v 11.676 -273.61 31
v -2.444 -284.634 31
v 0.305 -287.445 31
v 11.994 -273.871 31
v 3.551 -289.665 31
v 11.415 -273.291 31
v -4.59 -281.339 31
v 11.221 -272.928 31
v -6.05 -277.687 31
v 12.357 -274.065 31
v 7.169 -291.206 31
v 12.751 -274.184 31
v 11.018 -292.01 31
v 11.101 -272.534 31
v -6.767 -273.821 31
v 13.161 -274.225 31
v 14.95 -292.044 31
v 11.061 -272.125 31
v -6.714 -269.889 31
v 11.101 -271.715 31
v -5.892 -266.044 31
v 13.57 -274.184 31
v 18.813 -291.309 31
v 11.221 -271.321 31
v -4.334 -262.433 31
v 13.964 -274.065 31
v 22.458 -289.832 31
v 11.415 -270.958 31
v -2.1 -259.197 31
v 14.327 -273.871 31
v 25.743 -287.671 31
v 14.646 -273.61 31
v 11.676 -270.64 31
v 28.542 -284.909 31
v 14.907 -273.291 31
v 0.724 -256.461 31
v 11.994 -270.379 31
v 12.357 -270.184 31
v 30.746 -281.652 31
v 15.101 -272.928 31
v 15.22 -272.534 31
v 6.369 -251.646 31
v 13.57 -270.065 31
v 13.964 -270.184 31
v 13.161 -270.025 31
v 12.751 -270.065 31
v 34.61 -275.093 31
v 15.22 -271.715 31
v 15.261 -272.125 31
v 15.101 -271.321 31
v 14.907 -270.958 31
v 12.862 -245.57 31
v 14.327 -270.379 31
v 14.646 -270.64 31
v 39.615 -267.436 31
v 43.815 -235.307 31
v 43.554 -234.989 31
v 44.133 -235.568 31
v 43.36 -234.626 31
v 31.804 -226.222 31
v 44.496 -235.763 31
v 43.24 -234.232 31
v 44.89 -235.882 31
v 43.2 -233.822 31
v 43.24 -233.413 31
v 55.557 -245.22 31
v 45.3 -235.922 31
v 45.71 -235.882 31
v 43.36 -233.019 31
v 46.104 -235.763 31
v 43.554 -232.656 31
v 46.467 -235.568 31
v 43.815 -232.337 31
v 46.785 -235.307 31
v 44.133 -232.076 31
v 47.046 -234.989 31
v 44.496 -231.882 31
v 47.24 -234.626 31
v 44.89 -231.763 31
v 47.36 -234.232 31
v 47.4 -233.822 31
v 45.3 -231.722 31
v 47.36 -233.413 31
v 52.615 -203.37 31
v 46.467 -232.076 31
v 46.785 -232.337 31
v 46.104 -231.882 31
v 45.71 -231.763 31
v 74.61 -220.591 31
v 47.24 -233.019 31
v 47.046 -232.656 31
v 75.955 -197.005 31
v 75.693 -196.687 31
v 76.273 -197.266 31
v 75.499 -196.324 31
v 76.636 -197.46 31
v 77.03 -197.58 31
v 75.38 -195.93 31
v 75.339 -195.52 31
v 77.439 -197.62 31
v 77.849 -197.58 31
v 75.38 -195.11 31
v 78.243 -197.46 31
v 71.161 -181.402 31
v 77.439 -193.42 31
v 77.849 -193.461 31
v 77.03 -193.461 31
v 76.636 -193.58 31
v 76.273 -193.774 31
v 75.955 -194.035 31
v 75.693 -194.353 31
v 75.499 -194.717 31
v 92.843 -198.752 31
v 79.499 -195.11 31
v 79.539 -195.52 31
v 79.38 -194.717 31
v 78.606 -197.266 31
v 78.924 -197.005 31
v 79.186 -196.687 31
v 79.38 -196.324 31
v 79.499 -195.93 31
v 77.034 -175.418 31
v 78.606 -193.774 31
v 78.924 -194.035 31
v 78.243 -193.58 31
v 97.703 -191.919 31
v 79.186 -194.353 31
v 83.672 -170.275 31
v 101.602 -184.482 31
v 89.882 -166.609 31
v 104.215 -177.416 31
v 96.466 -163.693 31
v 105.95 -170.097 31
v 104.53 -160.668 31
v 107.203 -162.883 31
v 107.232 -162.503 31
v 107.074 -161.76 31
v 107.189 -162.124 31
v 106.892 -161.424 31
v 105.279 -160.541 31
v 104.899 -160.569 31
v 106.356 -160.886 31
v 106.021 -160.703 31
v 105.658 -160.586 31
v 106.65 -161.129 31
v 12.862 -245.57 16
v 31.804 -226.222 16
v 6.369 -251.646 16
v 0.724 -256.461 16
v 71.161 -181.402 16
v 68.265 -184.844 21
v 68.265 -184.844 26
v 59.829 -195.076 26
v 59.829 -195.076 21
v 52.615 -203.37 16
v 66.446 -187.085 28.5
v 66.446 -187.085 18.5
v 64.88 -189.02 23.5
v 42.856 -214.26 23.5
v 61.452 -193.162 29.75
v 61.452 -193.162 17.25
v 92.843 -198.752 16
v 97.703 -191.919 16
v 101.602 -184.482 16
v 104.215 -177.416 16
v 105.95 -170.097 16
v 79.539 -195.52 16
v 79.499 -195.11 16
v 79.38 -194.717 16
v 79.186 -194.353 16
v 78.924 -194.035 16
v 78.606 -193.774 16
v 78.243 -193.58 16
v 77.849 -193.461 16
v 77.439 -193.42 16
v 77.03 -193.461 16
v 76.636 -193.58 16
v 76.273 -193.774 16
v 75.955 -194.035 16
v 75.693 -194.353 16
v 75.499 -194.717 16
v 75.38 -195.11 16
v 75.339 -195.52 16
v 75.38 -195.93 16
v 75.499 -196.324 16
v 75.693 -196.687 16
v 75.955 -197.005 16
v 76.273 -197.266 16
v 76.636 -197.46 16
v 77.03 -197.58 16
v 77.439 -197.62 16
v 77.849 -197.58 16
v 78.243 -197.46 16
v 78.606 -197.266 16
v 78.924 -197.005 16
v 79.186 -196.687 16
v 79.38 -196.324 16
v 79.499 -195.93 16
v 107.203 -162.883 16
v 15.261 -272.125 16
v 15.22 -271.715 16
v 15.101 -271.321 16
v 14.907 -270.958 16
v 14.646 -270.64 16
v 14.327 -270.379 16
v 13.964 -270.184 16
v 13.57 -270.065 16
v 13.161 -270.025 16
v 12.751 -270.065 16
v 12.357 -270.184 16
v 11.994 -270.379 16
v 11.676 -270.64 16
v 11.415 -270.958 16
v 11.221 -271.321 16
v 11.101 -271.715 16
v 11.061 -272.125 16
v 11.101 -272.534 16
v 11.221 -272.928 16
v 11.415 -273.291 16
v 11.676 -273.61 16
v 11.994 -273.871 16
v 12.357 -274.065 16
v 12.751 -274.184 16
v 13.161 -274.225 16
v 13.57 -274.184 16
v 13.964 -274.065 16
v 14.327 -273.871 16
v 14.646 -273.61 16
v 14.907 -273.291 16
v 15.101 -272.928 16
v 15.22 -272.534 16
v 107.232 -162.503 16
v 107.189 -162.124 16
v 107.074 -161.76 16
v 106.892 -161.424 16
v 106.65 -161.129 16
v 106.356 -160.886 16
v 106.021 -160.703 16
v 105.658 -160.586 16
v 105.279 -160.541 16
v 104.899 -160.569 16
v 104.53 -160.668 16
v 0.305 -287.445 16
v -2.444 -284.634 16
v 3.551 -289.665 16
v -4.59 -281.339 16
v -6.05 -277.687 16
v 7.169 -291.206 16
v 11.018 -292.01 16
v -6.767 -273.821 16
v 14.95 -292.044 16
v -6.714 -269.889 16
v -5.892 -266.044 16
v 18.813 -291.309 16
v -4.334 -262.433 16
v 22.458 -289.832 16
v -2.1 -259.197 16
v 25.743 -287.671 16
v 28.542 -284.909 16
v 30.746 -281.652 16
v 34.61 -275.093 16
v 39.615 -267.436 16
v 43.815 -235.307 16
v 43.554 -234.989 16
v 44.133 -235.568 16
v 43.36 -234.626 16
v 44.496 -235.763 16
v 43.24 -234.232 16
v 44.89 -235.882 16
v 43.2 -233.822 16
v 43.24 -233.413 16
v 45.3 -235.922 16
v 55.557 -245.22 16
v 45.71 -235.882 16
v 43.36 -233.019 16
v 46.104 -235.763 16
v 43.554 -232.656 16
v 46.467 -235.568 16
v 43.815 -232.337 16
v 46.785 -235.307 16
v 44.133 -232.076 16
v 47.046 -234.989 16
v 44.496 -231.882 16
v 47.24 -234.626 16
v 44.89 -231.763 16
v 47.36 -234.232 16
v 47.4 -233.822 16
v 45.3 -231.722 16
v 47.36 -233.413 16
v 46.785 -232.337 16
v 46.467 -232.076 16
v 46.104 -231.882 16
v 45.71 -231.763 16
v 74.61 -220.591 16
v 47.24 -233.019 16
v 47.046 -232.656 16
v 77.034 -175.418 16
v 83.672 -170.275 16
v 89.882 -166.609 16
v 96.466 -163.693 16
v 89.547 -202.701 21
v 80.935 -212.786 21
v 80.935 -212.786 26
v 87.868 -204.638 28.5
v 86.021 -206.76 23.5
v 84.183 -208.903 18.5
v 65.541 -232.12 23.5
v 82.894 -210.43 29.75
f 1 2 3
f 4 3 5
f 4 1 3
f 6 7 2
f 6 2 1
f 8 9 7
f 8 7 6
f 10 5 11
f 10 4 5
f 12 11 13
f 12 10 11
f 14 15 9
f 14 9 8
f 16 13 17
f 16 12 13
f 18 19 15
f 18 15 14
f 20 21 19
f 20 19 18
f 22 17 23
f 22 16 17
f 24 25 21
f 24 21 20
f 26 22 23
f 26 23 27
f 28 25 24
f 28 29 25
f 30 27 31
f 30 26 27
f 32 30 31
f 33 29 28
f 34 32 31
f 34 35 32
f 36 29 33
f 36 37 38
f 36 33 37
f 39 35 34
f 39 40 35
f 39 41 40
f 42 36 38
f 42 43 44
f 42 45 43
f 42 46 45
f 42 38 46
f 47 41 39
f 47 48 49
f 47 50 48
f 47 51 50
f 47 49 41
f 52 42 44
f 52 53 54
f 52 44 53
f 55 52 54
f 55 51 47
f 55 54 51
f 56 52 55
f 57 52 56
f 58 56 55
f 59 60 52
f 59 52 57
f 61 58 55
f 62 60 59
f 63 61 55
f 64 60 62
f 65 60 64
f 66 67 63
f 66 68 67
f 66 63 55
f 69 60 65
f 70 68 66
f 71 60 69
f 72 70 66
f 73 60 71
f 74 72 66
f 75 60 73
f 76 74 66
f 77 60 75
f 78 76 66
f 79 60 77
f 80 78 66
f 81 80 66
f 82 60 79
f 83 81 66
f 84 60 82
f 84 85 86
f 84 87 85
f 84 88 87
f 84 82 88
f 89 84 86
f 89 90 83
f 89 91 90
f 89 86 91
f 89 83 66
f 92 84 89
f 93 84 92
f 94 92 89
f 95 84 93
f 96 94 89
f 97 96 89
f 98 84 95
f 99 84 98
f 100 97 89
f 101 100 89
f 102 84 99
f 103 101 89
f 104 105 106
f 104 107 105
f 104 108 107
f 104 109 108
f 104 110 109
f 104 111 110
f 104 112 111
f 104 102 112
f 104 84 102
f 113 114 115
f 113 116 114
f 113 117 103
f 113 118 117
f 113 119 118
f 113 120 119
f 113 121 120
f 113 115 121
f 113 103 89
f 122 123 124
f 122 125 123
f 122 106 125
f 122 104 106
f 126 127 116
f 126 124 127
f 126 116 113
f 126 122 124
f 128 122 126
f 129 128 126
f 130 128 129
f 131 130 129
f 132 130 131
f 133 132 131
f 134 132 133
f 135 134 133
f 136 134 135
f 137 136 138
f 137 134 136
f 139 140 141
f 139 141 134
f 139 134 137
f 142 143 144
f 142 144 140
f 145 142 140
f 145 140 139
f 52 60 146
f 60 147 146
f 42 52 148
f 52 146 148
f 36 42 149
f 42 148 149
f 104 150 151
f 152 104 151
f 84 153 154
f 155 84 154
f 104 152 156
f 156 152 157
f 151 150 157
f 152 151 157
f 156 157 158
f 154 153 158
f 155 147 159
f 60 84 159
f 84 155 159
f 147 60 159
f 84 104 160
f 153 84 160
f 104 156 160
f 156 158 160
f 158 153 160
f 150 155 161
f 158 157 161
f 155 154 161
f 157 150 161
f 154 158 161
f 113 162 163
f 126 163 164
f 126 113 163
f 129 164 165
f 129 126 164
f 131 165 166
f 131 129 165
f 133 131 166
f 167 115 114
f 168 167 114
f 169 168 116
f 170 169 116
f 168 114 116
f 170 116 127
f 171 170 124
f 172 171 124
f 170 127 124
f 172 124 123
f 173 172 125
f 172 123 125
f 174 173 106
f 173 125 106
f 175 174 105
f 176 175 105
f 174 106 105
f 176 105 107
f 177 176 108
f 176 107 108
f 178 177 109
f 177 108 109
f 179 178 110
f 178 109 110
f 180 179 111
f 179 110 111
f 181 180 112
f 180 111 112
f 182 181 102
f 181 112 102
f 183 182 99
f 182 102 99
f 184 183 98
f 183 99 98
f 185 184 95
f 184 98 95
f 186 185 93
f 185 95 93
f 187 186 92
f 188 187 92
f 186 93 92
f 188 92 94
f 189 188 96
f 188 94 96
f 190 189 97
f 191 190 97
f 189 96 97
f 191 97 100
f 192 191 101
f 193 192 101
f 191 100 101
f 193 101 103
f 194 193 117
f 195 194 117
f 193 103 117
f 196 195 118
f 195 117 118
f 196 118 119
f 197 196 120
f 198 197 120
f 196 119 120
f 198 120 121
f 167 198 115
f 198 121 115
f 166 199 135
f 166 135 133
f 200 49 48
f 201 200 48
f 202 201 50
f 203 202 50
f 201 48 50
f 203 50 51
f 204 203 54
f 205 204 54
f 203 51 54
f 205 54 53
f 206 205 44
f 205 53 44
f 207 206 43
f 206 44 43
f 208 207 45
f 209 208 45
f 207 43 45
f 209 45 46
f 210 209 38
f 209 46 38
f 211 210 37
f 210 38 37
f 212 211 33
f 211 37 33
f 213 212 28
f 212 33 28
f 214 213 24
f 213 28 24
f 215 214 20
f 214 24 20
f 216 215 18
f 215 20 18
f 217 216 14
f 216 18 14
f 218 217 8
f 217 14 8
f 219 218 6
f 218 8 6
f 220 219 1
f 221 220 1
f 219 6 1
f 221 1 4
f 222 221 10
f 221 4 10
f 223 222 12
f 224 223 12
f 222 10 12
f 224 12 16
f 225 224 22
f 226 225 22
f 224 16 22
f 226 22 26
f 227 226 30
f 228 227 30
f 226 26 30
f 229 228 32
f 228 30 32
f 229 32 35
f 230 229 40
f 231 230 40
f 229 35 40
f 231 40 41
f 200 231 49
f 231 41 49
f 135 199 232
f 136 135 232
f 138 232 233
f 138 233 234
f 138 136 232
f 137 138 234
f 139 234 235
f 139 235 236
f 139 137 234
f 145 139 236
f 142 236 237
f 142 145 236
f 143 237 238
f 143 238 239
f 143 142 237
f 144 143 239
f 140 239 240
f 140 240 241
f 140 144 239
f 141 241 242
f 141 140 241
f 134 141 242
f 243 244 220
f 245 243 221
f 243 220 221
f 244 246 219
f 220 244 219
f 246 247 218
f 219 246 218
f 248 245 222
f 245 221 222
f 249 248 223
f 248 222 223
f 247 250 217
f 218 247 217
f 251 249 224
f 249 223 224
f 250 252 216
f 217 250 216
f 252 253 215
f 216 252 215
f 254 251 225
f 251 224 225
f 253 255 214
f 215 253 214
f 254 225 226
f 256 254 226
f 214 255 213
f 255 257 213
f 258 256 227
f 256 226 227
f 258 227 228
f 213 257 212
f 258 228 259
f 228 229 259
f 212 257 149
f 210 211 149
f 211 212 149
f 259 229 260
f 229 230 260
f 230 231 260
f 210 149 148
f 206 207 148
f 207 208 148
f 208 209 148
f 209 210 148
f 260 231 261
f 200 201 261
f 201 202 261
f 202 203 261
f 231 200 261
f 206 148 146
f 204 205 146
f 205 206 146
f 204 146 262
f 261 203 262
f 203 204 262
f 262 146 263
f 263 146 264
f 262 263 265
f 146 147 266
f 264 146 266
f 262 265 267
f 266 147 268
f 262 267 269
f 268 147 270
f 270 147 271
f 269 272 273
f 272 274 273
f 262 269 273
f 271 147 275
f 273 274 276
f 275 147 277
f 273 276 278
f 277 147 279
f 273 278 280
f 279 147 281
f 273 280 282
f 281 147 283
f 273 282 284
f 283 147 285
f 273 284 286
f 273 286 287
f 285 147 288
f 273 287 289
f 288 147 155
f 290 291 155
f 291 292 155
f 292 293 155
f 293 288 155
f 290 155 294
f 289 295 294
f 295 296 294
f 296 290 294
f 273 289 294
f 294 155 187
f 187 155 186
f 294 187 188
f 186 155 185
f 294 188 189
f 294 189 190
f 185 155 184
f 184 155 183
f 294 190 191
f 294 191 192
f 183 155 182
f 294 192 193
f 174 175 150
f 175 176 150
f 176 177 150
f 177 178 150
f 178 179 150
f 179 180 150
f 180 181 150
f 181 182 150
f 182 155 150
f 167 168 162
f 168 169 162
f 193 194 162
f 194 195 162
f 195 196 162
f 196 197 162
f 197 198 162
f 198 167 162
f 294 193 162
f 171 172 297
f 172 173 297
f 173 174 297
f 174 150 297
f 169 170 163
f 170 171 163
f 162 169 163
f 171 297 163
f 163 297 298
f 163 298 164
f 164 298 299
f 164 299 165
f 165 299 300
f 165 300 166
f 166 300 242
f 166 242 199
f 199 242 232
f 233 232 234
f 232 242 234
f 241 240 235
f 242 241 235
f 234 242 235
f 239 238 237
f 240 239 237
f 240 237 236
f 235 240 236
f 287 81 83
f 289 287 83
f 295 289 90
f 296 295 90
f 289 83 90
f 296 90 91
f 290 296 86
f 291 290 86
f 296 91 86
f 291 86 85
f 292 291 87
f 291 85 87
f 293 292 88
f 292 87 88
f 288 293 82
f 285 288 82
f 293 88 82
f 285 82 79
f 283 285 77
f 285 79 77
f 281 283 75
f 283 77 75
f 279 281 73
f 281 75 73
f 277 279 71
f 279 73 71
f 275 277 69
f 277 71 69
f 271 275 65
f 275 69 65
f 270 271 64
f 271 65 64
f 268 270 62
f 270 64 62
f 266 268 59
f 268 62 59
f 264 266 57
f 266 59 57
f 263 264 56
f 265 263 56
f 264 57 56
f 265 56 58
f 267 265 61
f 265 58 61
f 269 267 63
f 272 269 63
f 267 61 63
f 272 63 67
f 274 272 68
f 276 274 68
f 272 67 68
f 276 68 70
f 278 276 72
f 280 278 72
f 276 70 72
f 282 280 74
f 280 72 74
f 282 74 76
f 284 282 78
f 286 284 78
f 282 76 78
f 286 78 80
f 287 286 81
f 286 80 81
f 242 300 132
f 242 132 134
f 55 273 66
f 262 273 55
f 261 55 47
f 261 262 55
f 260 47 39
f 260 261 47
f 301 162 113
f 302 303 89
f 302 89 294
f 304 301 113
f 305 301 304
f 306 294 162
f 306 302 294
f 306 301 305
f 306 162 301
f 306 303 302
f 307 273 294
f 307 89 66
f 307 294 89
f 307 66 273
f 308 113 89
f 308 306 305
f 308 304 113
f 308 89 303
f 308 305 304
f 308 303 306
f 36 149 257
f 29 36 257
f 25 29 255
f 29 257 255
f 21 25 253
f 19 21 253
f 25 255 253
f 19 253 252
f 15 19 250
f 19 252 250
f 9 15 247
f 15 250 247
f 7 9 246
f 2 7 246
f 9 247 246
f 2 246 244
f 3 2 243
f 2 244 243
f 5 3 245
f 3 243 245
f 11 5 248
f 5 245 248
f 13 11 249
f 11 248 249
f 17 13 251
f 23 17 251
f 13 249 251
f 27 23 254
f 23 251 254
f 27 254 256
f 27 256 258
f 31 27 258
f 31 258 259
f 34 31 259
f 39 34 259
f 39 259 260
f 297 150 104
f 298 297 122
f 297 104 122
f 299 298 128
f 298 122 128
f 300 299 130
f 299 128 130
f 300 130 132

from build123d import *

# Parameters (mm, degrees)
SKETCH3_R           = 1.6
BOSS_EXTRUDE1_DEPTH = 15
CUT_EXTRUDE1_START  = -15
SKETCH4_R           = 1.6
CUT_EXTRUDE1_DEPTH  = 15
FILLET3_R           = 62
SKETCH5_R           = 2.1
CUT_EXTRUDE2_DEPTH  = 15
FILLET4_R           = 2


with BuildPart() as part:
    # Sketch3 → Boss-Extrude1 (new body)
    with BuildSketch(Plane.XY.offset(16)):
        with BuildLine():
            ThreePointArc((155.019115612, -142.985112199), (159.394881243, -97.849485606), (115.704809966, -109.996492831))
            add(Edge.make_bspline(
                [(115.704809966, -109.996492831), (101.94879758, -150.116707379), (78.178790791, -171.772825461), (58.717079478, -197.082387325), (16.356999542, -244.049515564), (0.72448619, -256.46124476)],
                knots=[0, 0, 0, 0, 0.619090324, 0.719090324, 1, 1, 1, 1], degree=3))
            ThreePointArc((0.72448619, -256.46124476), (0.304947846, -287.445485278), (30.74561606, -281.651963762))
            add(Edge.make_bspline(
                [(155.019115612, -142.985112199), (117.897123756, -163.498941991), (100.69762913, -190.668374405), (79.152067085, -214.229377889), (40.254225745, -264.101669257), (30.74561606, -281.651963762)],
                knots=[0, 0, 0, 0, 0.619090324, 0.719090324, 1, 1, 1, 1], degree=3))
        make_face()
        with Locations((135.218221977, -112.415707792)):
            Circle(SKETCH3_R, mode=Mode.SUBTRACT)
        with Locations((148.218221977, -112.415707792)):
            Circle(SKETCH3_R, mode=Mode.SUBTRACT)
        with Locations((148.218221977, -125.415707792)):
            Circle(SKETCH3_R, mode=Mode.SUBTRACT)
        with Locations((135.218221977, -125.415707792)):
            Circle(SKETCH3_R, mode=Mode.SUBTRACT)
        with Locations((77.439461008, -195.520152104)):
            Circle(SKETCH3_R, mode=Mode.SUBTRACT)
        with Locations((45.300080524, -233.82237426)):
            Circle(SKETCH3_R, mode=Mode.SUBTRACT)
        with Locations((13.16070004, -272.124596416)):
            Circle(SKETCH3_R, mode=Mode.SUBTRACT)
    extrude(amount=BOSS_EXTRUDE1_DEPTH)

    # Sketch4 → Cut-Extrude1 (cut)
    with BuildSketch(Plane.XY.offset(31).offset(CUT_EXTRUDE1_START)):
        with BuildLine():
            add(Edge.make_bspline(
                [(115.704809966, -109.996492831), (106.058622012, -138.130164086), (93.113701565, -155.703600822), (81.681620369, -169.238644056)],
                knots=[0, 0, 0, 0, 0.434127381, 0.434127381, 0.434127381, 0.434127381], degree=3))
            Line((81.681620369, -169.238644056), (107.801063948, -159.441089101))
            Line((107.801063948, -159.441089101), (103.173332299, -186.075062907))
            add(Edge.make_bspline(
                [(155.019115612, -142.985112199), (129.435323739, -157.122865204), (114.450199889, -172.627251292), (103.173332299, -186.075062907)],
                knots=[0, 0, 0, 0, 0.426665629, 0.426665629, 0.426665629, 0.426665629], degree=3))
            ThreePointArc((155.019115612, -142.985112199), (157.145110388, -141.681056767), (159.144213742, -140.189748569))
            Line((159.144213742, -140.189748569), (159.161693107, -140.175418866))
            ThreePointArc((159.161693107, -140.175418866), (158.677203155, -97.267544882), (116.900921238, -107.068700404))
            ThreePointArc((116.900921238, -107.068700404), (116.260741116, -108.51538721), (115.704809966, -109.996492831))
        make_face()
        with Locations((135.218221977, -125.415707792)):
            Circle(SKETCH4_R, mode=Mode.SUBTRACT)
        with Locations((148.218221977, -125.415707792)):
            Circle(SKETCH4_R, mode=Mode.SUBTRACT)
        with Locations((135.218221977, -112.415707792)):
            Circle(SKETCH4_R, mode=Mode.SUBTRACT)
        with Locations((148.218221977, -112.415707792)):
            Circle(SKETCH4_R, mode=Mode.SUBTRACT)
    extrude(amount=CUT_EXTRUDE1_DEPTH, mode=Mode.SUBTRACT)


with BuildPart() as cut_extrude1_kept_piece:
    # of the separate pieces the step leaves, the one the design keeps (cut_extrude1_pieces_kept)
    add(part.part.solids().sort_by_distance((30.74561606, -281.651963762, 16))[0])

    # Fillet3
    fillet3_edges = [cut_extrude1_kept_piece.edges().sort_by_distance(p)[0] for p in [
        (81.681620369, -169.238644056, 23.5),
        (103.173332299, -186.075062907, 23.5),
    ]]
    fillet(fillet3_edges, radius=FILLET3_R)

    # Sketch5 → Cut-Extrude2 (cut)
    with BuildSketch(Plane.XY.offset(31)):
        with Locations((77.439461008, -195.520152104)):
            Circle(SKETCH5_R)
        with Locations((45.300080524, -233.82237426)):
            Circle(SKETCH5_R)
        with Locations((13.16070004, -272.124596416)):
            Circle(SKETCH5_R)
    extrude(amount=-CUT_EXTRUDE2_DEPTH, mode=Mode.SUBTRACT)

    # Fillet4
    fillet4_edges = [cut_extrude1_kept_piece.edges().sort_by_distance(p)[0] for p in [
        (107.801063948, -159.441089101, 23.5),
    ]]
    fillet(fillet4_edges, radius=FILLET4_R)


solid = cut_extrude1_kept_piece.part
